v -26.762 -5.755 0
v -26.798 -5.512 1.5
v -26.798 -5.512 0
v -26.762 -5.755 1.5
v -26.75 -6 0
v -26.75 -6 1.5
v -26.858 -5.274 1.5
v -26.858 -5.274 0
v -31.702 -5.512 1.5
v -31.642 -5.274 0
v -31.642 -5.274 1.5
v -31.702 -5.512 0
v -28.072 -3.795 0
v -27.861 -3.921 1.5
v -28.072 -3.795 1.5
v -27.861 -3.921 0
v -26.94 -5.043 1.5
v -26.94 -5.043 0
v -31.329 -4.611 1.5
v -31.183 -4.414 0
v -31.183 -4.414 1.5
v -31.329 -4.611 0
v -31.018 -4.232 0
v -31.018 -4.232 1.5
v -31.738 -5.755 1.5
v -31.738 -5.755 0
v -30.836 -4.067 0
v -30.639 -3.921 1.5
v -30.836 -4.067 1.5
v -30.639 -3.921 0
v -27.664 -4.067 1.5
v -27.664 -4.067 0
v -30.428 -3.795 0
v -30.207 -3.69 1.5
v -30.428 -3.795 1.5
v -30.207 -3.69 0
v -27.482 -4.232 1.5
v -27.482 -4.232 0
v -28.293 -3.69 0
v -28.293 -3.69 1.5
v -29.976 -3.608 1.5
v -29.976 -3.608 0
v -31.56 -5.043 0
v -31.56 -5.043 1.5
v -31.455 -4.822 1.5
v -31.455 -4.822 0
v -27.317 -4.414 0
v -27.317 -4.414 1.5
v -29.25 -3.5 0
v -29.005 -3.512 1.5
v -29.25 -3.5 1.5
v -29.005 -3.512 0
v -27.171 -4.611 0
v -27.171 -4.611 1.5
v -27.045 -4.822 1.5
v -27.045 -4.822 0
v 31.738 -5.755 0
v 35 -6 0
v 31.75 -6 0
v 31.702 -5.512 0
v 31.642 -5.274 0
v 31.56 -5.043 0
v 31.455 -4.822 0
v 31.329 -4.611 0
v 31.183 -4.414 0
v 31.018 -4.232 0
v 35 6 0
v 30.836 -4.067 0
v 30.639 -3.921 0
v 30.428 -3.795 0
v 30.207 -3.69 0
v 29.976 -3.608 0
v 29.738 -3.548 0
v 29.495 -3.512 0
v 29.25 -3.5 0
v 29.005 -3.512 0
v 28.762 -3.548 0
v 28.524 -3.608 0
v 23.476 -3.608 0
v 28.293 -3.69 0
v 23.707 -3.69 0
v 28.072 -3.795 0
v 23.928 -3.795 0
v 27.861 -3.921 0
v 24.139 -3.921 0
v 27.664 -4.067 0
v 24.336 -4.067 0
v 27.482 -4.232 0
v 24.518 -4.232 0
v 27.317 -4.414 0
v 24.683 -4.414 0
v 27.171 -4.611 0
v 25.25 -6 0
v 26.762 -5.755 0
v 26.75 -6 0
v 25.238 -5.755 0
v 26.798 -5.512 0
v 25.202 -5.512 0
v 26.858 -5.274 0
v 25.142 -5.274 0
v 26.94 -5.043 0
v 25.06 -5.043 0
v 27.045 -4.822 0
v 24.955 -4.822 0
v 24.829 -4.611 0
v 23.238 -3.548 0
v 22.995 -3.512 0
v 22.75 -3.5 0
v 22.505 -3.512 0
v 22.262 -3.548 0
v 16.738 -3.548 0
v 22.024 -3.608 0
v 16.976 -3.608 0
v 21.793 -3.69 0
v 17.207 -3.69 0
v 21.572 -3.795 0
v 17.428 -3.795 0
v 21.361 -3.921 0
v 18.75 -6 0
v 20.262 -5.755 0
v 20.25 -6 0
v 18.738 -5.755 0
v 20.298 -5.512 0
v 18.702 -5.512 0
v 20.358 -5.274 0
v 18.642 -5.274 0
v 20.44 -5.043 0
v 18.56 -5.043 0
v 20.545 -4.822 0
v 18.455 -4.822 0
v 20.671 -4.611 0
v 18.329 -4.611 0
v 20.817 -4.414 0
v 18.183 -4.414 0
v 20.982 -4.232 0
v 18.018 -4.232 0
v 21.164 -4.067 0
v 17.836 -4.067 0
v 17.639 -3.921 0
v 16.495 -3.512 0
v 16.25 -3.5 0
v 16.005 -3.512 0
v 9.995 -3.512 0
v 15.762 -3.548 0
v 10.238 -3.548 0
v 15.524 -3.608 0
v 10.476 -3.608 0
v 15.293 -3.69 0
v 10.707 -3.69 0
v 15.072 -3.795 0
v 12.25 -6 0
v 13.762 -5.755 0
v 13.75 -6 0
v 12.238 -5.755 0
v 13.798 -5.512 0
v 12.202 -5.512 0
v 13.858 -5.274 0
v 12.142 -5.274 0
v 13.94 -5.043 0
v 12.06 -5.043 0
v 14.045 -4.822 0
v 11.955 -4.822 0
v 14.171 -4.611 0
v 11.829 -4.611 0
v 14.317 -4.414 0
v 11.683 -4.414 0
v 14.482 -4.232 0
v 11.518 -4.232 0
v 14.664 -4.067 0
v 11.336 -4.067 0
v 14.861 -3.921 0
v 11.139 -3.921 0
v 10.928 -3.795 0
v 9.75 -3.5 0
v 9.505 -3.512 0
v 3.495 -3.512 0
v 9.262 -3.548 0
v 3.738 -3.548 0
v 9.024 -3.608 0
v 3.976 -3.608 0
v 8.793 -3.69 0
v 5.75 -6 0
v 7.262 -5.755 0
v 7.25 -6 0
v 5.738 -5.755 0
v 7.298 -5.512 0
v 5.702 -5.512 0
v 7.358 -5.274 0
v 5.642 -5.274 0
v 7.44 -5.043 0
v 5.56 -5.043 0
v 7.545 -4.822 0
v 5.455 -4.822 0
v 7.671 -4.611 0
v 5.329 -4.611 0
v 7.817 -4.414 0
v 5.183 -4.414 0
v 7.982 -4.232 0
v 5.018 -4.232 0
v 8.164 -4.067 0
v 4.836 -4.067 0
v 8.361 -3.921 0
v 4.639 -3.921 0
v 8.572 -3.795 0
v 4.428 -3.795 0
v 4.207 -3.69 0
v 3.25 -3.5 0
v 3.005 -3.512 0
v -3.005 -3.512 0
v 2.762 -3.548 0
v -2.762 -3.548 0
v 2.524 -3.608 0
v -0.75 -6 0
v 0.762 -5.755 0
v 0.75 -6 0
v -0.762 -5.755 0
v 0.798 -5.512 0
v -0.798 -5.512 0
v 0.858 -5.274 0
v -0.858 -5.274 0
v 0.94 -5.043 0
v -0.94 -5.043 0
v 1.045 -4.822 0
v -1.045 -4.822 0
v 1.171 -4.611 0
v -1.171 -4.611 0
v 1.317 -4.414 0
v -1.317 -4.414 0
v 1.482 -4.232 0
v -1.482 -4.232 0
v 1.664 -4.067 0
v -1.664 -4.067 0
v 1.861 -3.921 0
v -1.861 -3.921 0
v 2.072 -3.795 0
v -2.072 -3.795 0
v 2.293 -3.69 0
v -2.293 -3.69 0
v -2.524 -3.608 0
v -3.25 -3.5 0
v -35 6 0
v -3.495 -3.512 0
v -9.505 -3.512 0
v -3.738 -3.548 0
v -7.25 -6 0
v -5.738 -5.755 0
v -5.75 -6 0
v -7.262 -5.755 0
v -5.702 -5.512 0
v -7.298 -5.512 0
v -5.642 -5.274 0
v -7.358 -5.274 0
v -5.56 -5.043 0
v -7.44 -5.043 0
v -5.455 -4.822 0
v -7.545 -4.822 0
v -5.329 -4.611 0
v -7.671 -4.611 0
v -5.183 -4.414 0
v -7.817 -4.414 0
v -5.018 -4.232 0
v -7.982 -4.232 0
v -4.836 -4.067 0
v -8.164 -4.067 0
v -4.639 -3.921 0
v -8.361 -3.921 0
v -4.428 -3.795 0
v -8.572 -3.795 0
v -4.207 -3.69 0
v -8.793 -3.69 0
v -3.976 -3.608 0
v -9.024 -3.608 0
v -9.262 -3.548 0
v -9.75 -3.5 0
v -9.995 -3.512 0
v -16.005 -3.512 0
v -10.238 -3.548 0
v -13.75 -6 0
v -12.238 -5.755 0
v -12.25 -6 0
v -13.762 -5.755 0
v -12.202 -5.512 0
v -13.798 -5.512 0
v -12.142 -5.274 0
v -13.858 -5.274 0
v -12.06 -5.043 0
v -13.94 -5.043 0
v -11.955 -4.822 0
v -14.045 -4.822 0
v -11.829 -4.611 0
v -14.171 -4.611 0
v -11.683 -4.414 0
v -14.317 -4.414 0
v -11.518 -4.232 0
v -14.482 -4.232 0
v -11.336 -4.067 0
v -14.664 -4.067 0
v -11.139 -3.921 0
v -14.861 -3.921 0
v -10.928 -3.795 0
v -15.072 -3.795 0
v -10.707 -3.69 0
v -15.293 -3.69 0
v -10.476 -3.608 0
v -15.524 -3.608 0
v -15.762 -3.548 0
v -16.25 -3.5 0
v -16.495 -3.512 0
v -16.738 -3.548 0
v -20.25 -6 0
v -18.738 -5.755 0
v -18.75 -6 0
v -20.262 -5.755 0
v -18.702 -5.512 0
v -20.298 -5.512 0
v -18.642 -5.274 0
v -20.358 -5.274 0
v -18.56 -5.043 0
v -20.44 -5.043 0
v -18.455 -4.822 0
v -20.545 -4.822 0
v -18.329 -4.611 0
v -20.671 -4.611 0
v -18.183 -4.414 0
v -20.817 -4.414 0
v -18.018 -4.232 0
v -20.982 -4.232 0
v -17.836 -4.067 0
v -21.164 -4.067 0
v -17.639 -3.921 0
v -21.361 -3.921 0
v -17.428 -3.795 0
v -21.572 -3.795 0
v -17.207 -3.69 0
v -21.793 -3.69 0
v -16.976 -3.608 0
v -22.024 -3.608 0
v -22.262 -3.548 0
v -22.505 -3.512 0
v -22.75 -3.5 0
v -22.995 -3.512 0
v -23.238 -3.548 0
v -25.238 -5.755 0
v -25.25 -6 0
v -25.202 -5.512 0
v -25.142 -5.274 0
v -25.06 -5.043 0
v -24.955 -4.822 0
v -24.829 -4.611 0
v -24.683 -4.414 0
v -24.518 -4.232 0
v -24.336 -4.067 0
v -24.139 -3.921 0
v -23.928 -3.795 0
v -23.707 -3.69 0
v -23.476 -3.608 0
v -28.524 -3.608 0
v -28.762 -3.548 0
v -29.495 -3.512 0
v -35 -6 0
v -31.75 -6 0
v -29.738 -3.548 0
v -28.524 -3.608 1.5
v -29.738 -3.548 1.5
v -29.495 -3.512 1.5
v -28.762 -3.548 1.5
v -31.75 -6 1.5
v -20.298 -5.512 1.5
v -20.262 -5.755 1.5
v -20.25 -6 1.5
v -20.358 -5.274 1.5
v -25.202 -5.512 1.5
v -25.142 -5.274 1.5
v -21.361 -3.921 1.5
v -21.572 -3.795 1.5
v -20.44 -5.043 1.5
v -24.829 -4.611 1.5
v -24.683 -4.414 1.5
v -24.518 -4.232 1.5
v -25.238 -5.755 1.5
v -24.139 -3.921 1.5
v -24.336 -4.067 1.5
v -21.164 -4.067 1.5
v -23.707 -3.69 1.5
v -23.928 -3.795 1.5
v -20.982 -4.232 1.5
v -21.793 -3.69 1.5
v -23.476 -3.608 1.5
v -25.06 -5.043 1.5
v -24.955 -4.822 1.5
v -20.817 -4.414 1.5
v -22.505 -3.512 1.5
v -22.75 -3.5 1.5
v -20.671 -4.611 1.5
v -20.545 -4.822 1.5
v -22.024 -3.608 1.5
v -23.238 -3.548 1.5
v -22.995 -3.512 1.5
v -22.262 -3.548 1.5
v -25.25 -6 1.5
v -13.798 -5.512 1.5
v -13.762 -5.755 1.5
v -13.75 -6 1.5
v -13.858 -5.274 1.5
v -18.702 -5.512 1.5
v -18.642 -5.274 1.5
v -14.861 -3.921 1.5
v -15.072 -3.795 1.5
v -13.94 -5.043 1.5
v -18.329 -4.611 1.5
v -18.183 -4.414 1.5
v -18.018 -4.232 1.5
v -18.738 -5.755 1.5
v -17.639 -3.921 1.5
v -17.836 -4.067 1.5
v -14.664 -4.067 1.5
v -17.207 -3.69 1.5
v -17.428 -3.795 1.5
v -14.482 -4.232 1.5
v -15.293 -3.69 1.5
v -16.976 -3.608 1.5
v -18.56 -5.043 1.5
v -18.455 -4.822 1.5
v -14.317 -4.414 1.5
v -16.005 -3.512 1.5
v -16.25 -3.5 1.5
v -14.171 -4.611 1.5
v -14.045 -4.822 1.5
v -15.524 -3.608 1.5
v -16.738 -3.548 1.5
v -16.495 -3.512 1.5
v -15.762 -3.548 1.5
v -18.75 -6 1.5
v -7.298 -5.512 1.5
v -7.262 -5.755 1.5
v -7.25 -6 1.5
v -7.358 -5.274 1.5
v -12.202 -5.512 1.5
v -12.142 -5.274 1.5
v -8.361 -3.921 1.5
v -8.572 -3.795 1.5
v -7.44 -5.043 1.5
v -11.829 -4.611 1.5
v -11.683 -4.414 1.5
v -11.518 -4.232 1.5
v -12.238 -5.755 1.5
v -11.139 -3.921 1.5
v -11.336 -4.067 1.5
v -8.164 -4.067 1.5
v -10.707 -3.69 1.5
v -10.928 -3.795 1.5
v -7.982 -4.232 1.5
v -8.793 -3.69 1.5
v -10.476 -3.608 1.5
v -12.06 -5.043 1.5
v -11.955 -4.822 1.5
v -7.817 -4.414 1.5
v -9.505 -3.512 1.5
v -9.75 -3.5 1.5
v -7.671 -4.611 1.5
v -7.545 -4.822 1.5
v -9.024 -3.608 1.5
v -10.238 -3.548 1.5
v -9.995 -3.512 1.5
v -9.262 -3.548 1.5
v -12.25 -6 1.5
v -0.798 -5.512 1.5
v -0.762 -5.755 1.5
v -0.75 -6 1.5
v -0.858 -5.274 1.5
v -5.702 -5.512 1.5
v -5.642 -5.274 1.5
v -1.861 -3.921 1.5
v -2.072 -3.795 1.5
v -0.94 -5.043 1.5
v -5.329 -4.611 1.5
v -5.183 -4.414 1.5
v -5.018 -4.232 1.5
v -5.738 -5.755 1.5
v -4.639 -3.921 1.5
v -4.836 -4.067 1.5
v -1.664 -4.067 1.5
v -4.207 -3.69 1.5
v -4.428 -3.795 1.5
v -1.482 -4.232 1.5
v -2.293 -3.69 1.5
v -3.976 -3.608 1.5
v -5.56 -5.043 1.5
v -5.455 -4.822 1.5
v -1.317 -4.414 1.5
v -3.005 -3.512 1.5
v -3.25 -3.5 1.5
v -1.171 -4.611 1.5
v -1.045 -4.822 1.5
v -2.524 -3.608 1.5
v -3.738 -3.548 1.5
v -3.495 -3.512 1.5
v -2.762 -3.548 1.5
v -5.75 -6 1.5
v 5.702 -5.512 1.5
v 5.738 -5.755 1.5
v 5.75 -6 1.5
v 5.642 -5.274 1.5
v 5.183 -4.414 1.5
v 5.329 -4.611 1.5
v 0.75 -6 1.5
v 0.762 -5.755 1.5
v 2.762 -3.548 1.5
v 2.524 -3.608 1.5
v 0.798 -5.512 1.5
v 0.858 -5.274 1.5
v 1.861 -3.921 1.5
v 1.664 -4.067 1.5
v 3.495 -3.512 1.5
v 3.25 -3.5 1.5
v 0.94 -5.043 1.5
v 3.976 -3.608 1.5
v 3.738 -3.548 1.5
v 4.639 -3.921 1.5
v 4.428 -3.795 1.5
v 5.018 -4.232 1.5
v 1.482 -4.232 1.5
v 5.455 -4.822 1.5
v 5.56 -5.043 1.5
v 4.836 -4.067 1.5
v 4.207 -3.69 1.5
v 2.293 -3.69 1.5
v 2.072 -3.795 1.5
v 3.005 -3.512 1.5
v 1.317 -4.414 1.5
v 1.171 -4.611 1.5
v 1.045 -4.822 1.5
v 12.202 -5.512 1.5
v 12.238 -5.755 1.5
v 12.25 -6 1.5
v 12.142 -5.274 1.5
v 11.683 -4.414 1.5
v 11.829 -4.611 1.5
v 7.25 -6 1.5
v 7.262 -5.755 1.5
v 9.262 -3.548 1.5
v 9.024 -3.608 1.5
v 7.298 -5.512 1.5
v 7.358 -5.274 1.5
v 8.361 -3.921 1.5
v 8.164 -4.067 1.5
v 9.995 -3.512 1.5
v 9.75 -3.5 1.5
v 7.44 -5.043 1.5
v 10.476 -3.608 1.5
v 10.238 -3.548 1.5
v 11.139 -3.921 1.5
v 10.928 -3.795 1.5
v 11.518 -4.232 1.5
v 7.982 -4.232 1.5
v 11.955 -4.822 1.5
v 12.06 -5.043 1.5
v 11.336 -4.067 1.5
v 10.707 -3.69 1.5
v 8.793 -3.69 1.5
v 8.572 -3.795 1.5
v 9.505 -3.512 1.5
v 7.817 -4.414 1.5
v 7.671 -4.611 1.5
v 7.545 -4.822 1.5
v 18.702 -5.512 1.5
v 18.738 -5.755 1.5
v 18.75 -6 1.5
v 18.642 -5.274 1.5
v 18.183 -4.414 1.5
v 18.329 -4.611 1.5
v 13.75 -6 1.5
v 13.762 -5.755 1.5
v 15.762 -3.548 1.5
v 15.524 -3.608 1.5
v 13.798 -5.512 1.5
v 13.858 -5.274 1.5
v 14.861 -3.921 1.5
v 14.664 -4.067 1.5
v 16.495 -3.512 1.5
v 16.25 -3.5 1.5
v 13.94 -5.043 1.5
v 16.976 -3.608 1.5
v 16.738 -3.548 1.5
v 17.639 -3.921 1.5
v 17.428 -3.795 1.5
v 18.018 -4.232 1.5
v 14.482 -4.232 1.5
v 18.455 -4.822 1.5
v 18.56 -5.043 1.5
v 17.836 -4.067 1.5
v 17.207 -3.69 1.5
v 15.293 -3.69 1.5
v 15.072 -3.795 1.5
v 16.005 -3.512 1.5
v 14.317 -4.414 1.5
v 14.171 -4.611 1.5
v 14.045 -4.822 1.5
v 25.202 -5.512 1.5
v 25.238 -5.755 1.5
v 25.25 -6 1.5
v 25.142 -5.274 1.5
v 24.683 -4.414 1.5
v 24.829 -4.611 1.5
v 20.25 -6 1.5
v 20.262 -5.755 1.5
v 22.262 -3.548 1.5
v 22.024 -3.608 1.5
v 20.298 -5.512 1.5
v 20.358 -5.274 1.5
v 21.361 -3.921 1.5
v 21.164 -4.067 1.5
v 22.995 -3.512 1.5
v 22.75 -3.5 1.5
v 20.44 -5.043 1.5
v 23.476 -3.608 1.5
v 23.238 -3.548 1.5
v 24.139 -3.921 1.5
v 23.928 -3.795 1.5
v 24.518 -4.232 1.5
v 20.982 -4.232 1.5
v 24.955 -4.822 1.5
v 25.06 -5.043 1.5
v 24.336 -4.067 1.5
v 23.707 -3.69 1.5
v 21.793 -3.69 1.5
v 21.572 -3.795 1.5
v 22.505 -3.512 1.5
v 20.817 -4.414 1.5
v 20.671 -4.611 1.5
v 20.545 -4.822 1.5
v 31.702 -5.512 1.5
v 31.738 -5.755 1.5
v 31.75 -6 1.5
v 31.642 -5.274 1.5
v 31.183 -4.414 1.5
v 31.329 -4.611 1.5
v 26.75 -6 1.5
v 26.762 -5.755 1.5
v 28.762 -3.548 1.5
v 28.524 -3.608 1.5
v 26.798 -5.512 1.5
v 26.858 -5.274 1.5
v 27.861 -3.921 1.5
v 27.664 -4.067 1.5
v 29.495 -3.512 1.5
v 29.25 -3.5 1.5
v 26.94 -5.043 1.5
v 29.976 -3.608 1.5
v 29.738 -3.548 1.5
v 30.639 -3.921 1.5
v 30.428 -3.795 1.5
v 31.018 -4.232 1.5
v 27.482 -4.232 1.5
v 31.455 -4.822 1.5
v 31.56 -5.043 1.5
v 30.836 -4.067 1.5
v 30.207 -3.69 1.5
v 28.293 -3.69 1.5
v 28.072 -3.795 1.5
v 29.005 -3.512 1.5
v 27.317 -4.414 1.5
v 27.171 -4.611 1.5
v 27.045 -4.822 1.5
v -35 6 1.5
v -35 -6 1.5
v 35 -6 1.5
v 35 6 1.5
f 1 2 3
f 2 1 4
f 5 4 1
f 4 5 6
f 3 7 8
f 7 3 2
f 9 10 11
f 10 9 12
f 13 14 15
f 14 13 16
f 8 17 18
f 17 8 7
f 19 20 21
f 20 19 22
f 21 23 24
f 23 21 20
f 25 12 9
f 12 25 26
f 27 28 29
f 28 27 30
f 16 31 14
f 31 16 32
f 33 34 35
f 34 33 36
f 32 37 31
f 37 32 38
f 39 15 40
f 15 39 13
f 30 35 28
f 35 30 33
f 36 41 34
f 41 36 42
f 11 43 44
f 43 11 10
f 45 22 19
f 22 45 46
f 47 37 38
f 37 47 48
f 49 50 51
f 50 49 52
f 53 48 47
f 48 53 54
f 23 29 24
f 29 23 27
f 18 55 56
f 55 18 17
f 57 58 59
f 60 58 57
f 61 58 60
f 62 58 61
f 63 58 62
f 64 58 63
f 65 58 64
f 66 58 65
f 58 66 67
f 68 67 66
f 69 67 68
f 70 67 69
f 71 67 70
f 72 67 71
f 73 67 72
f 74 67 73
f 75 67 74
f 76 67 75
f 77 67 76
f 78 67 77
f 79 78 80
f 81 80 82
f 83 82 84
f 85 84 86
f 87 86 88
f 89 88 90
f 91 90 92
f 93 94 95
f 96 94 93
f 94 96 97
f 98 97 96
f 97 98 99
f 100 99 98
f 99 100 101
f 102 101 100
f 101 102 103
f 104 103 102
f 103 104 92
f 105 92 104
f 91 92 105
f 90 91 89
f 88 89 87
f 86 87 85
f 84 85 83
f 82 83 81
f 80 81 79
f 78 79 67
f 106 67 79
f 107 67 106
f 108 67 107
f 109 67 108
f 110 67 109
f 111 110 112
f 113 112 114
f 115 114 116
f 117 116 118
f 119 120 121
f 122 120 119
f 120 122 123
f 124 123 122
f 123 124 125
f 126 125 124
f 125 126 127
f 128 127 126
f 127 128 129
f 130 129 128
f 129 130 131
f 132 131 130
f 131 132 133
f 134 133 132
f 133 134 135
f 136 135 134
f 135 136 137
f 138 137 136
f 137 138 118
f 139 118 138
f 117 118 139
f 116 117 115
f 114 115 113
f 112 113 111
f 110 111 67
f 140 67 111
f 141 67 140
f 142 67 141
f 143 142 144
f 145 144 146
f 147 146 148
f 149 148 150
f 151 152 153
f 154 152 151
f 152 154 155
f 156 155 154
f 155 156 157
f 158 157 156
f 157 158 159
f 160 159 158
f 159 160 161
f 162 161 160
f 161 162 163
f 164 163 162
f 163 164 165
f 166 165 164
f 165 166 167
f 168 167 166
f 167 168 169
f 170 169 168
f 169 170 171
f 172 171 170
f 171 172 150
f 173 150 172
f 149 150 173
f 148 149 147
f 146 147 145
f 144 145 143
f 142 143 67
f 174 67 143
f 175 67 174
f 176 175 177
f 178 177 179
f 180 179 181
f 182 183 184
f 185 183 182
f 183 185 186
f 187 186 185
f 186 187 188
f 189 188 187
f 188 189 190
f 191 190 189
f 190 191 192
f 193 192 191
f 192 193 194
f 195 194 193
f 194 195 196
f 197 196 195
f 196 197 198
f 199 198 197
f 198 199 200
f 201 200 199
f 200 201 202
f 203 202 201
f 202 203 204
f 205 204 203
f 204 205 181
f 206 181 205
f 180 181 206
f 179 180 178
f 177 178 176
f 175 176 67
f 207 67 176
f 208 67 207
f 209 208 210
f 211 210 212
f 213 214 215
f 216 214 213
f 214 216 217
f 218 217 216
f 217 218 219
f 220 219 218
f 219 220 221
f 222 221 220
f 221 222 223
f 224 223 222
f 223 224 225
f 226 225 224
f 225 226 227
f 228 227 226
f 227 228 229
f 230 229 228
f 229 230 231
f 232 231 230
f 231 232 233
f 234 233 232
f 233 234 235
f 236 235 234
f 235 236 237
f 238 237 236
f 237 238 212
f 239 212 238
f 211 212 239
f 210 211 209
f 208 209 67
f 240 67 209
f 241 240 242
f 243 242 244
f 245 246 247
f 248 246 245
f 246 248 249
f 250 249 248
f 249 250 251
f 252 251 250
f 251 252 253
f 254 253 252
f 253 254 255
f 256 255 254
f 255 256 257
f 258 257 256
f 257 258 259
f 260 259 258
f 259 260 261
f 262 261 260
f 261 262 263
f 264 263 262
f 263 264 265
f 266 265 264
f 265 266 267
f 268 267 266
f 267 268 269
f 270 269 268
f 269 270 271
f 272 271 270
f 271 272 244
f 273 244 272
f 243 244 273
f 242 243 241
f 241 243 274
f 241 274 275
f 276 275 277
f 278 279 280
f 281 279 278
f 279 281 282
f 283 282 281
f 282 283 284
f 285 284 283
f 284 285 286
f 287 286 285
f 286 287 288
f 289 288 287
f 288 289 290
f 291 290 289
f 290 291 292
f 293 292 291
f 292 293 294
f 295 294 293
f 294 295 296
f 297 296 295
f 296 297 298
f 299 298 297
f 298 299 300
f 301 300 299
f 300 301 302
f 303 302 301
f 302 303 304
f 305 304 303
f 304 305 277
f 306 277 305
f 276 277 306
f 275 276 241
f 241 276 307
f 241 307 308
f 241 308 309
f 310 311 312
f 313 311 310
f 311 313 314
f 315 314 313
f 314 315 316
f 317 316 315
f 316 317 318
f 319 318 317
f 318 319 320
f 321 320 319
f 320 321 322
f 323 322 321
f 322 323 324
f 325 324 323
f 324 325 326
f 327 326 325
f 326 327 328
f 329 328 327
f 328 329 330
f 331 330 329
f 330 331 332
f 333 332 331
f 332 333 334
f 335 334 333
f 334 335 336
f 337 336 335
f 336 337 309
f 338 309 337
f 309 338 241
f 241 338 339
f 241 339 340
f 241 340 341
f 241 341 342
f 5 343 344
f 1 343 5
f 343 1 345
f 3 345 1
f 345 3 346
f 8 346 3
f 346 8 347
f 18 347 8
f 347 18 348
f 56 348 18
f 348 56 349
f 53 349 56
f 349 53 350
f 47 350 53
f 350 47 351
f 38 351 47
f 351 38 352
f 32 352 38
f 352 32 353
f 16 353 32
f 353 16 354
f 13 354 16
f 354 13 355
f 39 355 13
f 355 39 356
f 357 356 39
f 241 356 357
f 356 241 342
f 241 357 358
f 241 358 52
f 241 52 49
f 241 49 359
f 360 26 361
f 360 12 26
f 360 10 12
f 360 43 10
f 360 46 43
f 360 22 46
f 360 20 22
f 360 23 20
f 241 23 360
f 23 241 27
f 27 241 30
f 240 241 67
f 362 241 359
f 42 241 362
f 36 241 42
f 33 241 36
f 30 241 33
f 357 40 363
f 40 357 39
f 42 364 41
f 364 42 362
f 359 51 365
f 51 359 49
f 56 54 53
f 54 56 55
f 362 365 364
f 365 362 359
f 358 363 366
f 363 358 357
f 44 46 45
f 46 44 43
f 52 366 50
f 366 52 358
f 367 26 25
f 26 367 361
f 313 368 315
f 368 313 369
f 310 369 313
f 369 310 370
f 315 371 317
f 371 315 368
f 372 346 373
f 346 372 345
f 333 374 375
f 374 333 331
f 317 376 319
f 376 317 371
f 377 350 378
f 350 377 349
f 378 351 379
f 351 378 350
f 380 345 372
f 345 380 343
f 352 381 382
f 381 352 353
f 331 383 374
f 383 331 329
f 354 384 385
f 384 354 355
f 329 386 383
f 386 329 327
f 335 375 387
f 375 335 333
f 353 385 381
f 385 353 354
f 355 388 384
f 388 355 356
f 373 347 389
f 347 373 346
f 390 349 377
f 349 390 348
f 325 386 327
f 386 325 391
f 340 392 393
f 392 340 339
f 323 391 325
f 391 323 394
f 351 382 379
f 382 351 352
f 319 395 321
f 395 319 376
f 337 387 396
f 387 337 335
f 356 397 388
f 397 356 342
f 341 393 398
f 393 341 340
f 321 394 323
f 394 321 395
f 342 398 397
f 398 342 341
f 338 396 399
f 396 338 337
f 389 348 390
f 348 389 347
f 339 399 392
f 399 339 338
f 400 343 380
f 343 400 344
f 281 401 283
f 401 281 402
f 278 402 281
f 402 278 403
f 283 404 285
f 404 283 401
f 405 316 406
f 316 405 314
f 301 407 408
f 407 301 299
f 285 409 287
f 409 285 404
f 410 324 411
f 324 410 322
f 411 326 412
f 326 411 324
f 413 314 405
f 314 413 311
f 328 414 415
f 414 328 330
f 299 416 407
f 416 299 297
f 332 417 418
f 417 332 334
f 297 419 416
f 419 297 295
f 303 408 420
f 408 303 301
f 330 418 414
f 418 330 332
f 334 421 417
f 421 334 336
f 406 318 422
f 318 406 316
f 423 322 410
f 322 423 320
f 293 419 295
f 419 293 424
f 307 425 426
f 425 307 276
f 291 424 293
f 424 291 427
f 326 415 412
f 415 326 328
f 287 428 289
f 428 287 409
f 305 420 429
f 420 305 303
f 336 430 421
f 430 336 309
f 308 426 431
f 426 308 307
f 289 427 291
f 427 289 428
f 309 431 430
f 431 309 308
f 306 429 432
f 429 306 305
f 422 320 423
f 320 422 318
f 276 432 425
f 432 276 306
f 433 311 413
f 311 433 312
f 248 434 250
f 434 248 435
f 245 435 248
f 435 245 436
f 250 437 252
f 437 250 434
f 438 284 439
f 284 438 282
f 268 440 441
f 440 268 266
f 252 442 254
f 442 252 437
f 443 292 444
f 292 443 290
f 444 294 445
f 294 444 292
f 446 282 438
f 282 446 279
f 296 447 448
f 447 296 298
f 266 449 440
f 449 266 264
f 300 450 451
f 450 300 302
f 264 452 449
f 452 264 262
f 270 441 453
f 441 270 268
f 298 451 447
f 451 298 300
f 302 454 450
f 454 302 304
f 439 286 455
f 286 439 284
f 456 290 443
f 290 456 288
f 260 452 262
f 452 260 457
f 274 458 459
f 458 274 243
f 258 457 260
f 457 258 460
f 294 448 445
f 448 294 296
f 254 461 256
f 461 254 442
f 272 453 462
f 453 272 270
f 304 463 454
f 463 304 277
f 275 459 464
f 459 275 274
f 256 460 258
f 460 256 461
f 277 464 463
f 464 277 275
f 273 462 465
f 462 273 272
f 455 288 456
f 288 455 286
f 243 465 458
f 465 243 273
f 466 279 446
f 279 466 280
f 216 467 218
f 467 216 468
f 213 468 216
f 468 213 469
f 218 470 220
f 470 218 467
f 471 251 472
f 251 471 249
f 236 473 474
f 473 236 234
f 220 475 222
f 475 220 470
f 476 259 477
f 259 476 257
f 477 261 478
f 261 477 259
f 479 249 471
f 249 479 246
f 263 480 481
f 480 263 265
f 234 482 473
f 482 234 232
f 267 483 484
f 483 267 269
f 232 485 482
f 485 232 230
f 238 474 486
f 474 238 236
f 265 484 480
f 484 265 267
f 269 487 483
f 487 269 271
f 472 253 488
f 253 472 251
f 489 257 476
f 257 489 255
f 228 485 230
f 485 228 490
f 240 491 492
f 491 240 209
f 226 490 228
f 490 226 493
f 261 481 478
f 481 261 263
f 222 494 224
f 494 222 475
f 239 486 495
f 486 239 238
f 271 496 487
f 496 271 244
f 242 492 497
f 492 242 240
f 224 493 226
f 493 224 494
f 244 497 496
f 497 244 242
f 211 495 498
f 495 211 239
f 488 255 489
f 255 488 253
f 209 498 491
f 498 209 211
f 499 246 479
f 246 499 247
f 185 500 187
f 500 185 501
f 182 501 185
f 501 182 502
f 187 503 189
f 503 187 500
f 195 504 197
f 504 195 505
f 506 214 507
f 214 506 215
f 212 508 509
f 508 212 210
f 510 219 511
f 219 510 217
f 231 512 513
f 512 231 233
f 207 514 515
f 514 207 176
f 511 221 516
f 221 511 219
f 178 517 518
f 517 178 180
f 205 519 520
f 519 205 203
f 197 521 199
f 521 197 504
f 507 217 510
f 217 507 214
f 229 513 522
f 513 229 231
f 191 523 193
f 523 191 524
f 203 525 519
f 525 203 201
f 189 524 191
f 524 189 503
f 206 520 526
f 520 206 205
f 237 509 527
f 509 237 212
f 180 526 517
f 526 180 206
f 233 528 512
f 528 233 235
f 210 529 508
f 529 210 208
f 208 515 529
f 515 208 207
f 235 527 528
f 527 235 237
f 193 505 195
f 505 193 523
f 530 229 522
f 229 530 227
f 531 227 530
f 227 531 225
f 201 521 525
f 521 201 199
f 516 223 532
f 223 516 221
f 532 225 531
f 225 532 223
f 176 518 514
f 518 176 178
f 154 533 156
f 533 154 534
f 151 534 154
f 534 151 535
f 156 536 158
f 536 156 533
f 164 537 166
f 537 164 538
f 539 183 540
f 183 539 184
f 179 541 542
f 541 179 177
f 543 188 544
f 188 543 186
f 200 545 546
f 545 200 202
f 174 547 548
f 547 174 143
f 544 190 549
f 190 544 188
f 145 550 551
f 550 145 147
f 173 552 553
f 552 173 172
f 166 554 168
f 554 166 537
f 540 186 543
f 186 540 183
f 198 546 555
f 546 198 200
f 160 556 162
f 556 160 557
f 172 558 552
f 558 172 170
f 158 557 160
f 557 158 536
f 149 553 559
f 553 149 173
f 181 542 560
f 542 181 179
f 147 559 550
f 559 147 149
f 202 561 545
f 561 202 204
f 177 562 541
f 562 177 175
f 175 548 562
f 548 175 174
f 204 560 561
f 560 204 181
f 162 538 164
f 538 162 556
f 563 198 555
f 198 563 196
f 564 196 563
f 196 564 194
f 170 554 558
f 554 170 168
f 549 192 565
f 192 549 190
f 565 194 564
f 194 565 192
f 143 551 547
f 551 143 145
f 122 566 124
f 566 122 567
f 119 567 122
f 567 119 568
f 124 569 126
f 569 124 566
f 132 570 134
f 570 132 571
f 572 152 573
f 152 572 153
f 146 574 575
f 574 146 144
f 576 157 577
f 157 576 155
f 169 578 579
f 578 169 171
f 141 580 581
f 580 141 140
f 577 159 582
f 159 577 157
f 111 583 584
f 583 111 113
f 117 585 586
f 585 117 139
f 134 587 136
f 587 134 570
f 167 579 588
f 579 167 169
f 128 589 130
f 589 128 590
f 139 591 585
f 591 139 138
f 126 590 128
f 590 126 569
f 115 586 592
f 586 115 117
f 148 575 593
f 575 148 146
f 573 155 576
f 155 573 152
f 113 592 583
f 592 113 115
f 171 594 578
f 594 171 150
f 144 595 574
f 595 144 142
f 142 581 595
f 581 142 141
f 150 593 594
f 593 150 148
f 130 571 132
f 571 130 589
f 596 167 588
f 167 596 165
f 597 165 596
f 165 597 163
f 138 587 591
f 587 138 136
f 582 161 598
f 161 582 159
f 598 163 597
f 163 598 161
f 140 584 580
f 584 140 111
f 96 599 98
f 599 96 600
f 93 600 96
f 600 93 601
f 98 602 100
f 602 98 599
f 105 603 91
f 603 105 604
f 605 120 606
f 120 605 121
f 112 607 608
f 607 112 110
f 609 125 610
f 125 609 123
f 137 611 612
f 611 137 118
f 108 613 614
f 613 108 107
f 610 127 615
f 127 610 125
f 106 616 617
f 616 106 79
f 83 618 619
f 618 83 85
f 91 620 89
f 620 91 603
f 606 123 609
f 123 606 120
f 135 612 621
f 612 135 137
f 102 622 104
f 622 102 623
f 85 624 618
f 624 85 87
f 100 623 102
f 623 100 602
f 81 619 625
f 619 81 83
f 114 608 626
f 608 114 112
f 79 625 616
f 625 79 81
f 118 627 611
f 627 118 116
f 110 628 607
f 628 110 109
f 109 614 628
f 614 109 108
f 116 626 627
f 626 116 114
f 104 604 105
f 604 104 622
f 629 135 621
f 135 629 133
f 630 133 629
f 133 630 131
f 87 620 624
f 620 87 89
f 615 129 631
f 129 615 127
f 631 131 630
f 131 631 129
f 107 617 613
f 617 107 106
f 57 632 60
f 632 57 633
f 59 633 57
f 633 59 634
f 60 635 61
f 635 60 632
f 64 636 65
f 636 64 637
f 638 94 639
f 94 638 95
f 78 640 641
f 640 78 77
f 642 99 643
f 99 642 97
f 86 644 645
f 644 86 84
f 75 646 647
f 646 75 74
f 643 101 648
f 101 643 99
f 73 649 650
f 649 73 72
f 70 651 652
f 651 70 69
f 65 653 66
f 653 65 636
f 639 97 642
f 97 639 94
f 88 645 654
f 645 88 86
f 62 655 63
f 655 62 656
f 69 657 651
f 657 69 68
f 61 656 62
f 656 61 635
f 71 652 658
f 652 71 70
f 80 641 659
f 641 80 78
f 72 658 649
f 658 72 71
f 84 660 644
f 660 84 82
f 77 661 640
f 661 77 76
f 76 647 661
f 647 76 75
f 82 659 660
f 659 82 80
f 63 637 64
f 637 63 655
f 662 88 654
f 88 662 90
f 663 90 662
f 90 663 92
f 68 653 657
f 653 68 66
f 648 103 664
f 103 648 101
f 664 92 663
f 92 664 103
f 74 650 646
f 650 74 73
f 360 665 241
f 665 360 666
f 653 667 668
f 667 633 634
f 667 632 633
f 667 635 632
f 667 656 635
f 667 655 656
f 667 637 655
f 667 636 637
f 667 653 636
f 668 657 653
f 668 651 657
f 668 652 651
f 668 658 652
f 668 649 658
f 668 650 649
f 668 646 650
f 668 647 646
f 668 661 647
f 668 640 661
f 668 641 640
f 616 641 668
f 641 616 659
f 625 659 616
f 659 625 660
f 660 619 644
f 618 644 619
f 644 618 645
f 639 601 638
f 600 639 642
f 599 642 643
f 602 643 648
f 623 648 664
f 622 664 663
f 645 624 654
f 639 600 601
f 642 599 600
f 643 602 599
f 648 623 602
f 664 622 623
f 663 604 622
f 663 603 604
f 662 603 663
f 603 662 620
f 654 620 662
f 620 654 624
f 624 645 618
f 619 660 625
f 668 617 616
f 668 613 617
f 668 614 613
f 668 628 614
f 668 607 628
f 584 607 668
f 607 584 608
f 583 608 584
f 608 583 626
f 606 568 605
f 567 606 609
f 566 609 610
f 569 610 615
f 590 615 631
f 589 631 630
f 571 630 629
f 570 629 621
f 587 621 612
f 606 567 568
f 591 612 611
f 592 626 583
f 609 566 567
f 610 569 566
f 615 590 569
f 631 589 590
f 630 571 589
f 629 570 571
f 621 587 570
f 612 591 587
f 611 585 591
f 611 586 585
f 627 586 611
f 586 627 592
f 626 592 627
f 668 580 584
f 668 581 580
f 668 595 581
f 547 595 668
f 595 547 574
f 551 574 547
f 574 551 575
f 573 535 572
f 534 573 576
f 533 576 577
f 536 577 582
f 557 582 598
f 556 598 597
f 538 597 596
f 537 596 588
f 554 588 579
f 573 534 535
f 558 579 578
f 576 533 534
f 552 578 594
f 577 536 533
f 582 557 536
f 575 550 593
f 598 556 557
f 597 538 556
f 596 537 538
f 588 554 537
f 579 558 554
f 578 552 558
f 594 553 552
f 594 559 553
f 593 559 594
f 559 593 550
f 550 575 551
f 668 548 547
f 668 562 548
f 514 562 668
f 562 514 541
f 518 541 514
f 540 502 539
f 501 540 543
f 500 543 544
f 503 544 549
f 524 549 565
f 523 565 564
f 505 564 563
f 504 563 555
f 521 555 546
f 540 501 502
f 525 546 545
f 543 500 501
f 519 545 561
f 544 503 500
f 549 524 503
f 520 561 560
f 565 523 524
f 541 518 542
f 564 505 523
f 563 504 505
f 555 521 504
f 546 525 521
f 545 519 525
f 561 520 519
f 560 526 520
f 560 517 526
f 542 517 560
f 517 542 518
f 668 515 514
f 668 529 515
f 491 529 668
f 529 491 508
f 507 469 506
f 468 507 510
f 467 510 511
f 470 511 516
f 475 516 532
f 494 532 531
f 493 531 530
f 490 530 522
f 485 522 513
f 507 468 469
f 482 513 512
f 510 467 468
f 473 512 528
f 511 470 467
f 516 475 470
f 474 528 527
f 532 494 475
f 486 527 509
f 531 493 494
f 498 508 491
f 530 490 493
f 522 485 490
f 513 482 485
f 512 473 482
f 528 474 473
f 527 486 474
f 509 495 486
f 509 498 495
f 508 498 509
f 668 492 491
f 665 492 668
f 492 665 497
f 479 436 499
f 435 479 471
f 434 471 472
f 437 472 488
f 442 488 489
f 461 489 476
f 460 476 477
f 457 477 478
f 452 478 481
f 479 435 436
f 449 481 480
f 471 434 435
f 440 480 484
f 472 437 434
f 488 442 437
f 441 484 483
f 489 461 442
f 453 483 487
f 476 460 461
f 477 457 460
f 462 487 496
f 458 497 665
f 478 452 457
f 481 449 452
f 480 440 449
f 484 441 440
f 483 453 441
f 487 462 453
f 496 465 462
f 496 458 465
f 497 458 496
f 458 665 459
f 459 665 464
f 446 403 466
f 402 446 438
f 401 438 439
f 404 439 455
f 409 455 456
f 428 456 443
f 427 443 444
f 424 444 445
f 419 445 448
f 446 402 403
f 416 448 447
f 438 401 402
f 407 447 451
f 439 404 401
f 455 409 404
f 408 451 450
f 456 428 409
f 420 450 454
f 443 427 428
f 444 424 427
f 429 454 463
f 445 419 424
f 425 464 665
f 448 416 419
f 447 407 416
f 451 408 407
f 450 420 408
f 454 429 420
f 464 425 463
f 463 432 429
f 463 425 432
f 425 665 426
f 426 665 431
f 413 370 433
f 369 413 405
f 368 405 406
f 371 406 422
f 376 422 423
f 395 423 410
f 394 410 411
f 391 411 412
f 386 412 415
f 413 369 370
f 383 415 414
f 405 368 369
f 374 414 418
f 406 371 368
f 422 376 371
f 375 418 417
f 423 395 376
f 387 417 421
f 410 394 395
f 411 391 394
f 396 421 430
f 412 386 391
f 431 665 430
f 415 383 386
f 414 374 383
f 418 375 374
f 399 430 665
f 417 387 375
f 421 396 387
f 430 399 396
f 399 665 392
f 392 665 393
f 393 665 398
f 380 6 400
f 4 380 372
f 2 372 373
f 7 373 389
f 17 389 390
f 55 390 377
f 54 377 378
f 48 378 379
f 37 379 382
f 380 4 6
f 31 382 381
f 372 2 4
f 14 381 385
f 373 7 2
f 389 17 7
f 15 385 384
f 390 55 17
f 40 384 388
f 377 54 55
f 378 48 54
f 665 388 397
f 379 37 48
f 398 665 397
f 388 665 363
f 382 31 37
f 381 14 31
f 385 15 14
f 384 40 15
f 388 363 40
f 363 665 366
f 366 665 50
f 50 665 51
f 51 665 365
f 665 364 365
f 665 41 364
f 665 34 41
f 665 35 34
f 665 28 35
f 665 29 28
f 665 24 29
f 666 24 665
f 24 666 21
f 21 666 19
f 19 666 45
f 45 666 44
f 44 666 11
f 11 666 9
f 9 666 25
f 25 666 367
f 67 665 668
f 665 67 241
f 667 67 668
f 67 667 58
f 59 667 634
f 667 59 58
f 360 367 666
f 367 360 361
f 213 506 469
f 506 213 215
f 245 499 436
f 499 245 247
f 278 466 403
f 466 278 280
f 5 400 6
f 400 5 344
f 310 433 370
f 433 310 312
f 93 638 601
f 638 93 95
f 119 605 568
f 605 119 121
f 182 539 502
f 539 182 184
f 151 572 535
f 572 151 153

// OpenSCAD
// 10-well agarose gel comb - flat plate with spine and hanging teeth.
// Orientation: Lying flat on XY plane, spine along X, teeth hanging in -Y.

// Dimensions
spine_len = 70;
spine_w   = 12;
plate_thk = 1.5;

tooth_w   = 5.0;
tooth_len = 12;
tooth_gap = 1.5;
n_teeth   = 10;

$fn = 64;

// Generate X positions for the teeth, centred on 0
// Formula: (i - (n-1)/2) * (tooth_w + tooth_gap)
tooth_positions = [for (i = [0 : n_teeth - 1]) let(pos = (i - (n_teeth - 1) / 2) * (tooth_w + tooth_gap)) pos];

difference() {
    // 1. Create the main spine plate
    // Extrude the spine rectangle to the full thickness.
    // Spine is 70mm long (X) and 12mm wide (Y).
    // Centred at origin: X from -35 to 35, Y from -6 to 6.
    translate([0, 0, 0])
    linear_extrude(height = plate_thk)
    square([spine_len, spine_w], center = true);

    // 2. Cut out the teeth
    // The teeth hang from the edge of the spine in the -Y direction.
    // Spine Y range: -6 to +6.
    // Teeth start at Y = -6 and extend to Y = -6 - 12 = -18.
    
    cut_y_start = -spine_w / 2; // Top edge of the spine (in -Y direction) = -6
    cut_y_end   = cut_y_start - tooth_len; // Bottom of the teeth = -18
    
    // We subtract cylinders (extruded rectangles) for each tooth.
    // The cut shape needs to extend slightly past the bottom of the teeth to ensure clean separation.
    cut_depth = tooth_len + 0.1;

    for (x = tooth_positions) {
        // Position the cylinder at the calculated X, starting at the spine edge (Y = -6)
        // The cylinder height is the cut_depth.
        // This creates a hole that goes from Y=-6 down to Y=-18.
        translate([x, cut_y_start, 0])
        cylinder(h = cut_depth + 0.1, d = tooth_w);
    }
}
